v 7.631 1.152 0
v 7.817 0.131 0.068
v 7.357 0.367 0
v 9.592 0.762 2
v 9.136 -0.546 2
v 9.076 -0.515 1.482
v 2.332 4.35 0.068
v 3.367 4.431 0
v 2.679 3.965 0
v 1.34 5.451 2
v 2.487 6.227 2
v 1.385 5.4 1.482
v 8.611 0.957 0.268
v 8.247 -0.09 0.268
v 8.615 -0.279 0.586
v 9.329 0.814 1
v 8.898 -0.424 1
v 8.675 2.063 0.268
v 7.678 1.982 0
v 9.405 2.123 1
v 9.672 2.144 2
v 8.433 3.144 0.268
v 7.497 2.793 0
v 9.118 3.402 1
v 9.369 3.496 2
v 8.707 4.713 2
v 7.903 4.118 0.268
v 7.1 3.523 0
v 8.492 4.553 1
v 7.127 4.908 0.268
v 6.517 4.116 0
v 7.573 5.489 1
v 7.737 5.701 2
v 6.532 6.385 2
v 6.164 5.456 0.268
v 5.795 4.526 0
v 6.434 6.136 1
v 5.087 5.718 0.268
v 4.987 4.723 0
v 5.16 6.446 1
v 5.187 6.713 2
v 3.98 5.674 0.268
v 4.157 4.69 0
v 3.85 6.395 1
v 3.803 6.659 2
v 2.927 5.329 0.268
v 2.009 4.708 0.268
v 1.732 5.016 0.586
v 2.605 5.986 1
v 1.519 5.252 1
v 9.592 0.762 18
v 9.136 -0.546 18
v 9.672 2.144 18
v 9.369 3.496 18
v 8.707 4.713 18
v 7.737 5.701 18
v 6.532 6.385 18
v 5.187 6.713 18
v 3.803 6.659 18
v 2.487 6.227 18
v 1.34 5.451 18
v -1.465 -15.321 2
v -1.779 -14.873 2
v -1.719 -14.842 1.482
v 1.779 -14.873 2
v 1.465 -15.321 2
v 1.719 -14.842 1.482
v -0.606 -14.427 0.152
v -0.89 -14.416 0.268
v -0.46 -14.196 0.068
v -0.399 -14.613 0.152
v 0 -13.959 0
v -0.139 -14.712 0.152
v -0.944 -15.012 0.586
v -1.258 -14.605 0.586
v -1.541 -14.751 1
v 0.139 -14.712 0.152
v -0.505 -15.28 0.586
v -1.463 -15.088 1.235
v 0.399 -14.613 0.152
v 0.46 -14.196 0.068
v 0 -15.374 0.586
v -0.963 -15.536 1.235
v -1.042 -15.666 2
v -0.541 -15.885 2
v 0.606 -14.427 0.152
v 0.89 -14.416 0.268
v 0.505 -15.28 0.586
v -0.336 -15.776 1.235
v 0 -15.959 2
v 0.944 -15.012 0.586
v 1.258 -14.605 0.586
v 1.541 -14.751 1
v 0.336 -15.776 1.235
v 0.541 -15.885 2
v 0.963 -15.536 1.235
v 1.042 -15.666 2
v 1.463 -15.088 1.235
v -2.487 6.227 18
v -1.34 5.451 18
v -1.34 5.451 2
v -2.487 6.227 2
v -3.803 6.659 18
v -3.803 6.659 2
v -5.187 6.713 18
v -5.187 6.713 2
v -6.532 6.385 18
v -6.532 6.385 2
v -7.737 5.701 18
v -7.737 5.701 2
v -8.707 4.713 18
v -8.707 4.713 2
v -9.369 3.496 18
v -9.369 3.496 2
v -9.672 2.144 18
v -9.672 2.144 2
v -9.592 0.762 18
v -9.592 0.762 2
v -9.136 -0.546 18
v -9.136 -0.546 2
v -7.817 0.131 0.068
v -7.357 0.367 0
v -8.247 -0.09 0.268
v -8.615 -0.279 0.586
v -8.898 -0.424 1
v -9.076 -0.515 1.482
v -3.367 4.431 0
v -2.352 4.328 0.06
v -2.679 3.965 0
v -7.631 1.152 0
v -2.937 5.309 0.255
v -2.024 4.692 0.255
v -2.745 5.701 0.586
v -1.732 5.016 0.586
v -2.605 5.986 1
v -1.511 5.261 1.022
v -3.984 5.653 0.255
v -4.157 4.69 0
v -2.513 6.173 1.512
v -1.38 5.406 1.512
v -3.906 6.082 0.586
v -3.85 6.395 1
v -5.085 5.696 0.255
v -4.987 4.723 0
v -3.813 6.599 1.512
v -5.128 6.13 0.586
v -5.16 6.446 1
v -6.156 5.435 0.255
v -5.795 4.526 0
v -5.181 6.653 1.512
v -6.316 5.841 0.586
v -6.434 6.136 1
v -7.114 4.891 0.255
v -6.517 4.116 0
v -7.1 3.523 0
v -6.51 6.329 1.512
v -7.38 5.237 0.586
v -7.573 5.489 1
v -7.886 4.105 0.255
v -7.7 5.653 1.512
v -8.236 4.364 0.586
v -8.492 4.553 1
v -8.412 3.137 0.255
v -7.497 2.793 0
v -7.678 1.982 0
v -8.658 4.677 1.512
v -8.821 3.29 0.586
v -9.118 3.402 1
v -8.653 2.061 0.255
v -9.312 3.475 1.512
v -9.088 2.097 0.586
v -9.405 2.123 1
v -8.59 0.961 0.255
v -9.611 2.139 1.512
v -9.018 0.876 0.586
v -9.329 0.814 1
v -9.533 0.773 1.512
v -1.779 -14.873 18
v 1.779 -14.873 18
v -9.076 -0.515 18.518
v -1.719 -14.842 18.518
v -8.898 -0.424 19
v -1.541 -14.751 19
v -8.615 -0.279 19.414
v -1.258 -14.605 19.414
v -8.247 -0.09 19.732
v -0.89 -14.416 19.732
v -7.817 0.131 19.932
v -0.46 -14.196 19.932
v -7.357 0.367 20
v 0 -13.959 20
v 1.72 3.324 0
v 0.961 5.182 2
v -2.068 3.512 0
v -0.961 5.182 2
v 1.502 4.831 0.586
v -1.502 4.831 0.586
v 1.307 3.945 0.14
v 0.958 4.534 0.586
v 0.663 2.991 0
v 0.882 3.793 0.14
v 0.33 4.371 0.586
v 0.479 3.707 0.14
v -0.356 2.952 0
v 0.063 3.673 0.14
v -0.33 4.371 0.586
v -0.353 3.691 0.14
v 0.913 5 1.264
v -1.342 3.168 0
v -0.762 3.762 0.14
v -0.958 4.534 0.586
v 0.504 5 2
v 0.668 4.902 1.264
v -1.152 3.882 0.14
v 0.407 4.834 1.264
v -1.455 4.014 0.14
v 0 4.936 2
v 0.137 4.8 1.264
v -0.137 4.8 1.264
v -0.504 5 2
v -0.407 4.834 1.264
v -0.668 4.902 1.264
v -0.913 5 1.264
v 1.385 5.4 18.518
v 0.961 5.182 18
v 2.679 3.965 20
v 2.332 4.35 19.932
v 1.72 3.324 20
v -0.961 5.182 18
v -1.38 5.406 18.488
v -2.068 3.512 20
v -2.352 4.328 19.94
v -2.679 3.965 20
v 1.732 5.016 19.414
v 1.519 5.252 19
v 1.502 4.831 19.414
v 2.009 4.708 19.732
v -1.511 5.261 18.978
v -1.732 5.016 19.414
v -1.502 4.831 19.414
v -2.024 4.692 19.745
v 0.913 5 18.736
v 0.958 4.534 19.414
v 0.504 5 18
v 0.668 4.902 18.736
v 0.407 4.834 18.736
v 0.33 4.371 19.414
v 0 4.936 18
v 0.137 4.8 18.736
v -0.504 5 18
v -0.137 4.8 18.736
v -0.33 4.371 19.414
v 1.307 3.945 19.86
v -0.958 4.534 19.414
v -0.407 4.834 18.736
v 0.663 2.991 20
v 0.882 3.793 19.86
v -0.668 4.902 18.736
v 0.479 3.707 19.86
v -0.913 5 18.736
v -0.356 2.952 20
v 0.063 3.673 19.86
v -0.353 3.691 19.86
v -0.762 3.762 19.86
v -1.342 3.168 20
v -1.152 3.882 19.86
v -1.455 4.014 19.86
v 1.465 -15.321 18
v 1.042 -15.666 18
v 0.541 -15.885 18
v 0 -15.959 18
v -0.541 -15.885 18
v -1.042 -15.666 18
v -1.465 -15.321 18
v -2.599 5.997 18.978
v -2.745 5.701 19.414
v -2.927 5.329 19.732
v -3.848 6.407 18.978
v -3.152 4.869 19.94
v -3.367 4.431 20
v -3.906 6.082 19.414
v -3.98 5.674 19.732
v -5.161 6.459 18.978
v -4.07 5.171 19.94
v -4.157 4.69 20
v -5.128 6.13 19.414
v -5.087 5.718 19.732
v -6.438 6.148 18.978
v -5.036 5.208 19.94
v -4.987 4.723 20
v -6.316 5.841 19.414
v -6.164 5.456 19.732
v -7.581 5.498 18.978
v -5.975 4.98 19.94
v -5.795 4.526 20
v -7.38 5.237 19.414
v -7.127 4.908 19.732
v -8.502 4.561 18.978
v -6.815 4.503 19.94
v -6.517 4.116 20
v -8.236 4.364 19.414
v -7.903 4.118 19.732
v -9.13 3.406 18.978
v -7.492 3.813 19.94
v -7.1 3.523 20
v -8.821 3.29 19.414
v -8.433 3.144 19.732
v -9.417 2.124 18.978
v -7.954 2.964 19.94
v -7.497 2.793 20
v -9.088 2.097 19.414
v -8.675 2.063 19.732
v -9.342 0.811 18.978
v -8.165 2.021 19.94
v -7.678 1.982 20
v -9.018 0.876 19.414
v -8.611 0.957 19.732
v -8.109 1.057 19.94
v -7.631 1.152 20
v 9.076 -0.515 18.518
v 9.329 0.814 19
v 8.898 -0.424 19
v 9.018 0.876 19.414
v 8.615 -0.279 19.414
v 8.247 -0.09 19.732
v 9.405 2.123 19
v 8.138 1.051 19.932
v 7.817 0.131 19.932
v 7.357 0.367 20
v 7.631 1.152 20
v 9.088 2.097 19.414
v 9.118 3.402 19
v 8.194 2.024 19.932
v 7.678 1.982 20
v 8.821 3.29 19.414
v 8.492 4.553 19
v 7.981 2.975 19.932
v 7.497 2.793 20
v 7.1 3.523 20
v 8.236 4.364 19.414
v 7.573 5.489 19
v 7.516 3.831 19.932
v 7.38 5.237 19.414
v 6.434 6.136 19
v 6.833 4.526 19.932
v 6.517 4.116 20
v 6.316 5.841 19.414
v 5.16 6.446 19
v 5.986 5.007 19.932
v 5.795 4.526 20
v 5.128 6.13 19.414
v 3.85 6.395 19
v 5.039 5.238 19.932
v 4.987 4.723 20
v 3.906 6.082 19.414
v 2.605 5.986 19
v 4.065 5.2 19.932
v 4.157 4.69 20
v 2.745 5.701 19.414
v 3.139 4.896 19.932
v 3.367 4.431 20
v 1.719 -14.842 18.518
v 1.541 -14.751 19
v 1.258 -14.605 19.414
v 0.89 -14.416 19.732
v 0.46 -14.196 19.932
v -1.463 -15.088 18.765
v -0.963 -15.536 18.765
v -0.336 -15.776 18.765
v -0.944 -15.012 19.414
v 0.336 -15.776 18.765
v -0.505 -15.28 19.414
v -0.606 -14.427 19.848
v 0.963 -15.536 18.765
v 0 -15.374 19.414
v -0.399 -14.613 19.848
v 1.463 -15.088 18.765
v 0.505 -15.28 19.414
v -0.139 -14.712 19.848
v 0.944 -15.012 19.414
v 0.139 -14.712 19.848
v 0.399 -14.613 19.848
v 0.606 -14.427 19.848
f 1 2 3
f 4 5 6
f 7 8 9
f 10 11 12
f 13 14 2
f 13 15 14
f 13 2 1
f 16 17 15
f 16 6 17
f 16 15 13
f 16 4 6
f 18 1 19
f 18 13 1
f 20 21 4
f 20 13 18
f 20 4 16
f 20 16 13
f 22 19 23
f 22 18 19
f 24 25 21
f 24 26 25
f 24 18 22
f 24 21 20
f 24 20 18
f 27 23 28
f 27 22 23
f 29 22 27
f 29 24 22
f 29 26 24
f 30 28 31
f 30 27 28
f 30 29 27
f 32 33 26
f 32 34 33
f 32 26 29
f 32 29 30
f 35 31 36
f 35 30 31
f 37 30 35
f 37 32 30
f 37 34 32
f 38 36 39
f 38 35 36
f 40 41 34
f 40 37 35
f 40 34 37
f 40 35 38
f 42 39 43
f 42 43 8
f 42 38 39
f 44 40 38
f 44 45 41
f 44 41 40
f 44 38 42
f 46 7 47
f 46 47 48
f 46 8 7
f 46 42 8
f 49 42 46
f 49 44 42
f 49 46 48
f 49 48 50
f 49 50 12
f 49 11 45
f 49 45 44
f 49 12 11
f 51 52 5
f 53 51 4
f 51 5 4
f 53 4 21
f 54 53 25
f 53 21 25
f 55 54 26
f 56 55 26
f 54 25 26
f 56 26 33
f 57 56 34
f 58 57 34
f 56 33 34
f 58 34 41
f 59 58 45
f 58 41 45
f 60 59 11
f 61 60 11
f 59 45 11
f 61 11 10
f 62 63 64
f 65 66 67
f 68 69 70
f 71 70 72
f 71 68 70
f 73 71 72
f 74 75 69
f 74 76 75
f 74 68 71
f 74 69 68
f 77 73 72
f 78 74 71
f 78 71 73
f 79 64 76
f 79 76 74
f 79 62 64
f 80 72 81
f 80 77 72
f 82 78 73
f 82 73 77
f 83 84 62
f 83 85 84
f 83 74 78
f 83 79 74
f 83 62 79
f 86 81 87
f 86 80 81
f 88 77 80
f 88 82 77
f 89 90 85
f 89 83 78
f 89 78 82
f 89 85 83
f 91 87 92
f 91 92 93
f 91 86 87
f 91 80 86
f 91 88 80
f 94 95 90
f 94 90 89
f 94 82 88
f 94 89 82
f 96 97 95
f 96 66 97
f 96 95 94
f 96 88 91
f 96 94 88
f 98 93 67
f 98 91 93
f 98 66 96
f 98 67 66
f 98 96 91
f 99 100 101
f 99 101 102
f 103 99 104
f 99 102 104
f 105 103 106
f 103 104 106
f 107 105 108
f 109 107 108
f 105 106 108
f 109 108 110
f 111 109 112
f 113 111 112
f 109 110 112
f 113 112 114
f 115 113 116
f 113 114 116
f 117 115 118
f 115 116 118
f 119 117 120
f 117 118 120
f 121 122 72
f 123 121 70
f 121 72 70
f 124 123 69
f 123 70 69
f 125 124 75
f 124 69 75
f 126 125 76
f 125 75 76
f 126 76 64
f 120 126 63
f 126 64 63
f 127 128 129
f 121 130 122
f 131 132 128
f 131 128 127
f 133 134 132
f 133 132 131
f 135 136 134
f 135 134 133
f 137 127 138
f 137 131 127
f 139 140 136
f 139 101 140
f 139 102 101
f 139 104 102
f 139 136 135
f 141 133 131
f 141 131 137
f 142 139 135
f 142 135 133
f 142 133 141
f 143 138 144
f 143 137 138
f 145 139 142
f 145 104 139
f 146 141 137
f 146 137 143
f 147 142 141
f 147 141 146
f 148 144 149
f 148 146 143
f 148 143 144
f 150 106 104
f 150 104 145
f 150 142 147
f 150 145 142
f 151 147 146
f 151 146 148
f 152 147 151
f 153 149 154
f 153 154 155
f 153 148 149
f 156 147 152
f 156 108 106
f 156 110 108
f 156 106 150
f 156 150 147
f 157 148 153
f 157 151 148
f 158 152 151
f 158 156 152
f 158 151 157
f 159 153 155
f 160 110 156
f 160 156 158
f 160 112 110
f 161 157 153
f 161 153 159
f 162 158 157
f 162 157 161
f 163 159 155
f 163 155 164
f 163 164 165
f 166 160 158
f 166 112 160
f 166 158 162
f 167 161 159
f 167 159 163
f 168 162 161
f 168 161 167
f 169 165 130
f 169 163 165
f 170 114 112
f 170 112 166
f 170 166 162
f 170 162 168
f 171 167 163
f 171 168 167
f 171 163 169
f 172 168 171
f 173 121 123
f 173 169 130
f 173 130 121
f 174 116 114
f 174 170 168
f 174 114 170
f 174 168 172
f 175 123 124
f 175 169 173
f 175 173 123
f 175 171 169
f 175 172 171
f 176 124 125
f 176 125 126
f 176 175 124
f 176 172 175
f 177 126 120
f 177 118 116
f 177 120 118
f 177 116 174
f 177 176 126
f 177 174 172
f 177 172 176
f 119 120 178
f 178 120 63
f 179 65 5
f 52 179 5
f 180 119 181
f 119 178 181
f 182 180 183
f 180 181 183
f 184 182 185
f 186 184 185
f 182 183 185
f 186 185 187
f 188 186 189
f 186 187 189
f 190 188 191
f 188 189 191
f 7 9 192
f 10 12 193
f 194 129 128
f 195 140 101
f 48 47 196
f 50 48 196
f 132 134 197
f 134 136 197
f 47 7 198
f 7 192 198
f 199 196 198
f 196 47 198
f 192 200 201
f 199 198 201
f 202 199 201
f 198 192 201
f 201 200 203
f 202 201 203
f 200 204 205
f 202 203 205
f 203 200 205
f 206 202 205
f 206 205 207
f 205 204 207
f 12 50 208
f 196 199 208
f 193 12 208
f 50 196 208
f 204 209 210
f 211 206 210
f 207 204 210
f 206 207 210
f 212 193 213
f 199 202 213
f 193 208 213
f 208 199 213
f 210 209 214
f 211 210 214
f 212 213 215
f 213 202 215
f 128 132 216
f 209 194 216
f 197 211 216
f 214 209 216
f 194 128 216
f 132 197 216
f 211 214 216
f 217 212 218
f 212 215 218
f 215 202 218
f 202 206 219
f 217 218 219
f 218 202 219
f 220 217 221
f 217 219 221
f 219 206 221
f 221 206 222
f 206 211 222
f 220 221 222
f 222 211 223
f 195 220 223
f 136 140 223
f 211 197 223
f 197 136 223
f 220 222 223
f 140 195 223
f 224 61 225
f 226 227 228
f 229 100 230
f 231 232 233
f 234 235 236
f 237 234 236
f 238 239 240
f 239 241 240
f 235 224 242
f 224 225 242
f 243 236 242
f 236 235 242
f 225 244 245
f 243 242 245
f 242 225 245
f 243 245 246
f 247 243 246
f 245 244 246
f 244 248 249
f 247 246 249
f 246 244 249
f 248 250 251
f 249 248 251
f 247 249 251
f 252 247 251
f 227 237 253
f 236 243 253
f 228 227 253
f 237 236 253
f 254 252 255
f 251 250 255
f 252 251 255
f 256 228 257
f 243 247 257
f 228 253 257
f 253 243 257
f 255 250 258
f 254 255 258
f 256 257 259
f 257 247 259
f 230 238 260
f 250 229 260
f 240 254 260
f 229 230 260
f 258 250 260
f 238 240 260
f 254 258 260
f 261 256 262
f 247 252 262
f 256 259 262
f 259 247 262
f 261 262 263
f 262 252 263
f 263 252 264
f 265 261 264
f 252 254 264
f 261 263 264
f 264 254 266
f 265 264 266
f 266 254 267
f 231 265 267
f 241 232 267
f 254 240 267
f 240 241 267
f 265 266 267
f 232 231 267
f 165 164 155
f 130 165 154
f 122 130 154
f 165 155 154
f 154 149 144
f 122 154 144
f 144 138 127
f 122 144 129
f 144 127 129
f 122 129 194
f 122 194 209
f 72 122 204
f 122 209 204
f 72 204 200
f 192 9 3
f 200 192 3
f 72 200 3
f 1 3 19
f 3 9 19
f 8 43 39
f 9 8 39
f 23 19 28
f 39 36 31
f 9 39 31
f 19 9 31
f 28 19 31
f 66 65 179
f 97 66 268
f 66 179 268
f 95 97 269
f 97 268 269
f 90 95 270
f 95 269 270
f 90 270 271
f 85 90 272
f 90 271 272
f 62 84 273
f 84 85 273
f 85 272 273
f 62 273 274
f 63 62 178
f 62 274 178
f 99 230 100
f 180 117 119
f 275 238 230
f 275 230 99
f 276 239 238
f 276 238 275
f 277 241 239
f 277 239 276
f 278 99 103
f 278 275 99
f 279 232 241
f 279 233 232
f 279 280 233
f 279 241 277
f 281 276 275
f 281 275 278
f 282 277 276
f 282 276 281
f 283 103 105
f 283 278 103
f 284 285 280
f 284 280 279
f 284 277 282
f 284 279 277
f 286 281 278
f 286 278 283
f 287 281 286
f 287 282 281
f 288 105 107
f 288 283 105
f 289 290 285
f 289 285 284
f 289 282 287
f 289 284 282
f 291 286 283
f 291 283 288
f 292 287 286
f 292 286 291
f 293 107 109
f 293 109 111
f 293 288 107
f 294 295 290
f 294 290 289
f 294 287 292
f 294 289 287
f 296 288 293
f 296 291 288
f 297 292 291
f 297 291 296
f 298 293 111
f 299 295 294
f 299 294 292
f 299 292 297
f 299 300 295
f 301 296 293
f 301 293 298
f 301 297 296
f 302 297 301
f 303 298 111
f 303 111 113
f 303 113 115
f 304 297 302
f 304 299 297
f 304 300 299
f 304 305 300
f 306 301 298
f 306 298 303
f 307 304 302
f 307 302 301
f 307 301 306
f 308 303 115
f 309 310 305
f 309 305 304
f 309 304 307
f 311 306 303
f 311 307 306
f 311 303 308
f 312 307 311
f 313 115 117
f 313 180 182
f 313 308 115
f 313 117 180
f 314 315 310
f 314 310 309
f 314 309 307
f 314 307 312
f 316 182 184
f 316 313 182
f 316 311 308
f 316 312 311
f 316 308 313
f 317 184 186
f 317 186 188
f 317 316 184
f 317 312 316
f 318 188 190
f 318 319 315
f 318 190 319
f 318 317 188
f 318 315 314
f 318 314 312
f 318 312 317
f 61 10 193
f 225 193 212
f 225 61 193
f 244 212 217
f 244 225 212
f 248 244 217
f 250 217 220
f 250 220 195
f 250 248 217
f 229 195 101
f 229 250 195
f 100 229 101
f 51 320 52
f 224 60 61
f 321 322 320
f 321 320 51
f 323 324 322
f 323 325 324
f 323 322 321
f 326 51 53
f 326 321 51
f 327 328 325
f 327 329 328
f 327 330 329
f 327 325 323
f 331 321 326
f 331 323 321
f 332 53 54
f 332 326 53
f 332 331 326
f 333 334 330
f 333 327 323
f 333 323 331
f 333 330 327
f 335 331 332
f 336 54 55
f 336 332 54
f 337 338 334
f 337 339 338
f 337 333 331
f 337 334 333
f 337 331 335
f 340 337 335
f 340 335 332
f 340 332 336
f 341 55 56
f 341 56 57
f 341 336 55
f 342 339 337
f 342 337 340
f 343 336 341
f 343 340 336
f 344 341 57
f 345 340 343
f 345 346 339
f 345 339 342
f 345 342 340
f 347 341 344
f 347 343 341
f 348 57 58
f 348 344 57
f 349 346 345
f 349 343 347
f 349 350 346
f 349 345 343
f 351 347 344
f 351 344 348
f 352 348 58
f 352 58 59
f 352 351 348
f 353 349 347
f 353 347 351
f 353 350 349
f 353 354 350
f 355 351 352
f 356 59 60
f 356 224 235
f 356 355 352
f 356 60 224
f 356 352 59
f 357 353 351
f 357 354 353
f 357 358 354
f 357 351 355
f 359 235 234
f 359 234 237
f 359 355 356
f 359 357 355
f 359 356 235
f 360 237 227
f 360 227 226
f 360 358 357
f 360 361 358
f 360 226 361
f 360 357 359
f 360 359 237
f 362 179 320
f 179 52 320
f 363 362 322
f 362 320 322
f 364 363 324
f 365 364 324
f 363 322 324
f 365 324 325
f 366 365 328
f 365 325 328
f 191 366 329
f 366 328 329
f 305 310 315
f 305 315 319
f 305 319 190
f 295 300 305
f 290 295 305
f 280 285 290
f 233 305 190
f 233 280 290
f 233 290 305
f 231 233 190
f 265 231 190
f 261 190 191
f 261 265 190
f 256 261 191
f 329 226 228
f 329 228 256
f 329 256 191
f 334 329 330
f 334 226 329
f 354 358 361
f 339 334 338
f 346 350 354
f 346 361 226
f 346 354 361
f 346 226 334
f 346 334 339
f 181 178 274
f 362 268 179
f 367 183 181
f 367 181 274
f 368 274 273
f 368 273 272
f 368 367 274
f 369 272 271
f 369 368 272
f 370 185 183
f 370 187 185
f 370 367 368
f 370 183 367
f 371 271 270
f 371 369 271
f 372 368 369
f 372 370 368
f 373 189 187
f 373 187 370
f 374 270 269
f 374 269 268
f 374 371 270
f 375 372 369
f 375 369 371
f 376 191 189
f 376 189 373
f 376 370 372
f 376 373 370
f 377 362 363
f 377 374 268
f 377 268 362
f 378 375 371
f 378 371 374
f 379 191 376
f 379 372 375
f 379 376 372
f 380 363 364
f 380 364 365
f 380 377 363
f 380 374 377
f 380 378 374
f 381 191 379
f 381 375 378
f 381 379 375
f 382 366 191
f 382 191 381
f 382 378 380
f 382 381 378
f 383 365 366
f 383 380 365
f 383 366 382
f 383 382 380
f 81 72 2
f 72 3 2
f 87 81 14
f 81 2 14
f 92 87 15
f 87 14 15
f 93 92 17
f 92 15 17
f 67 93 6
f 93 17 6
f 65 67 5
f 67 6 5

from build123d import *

# Parameters (mm, degrees)
F1_DEPTH = 20
F2_F1_R  = 2
F2_F2_R  = 2
F2_F3_R  = 2


with BuildPart() as f1:
    # F0 (on Top) → F1 (new body)
    with BuildSketch(Plane.XY):
        with BuildLine():
            ThreePointArc((0, 3.4753886408), (-6.702786735, 6.3139324677), (-9.1361551027, -0.5463444553))
            Line((-9.1361551027, -0.5463444553), (0, -18.3376532868))
            Line((0, -18.3376532868), (9.1361551027, -0.5463444553))
            ThreePointArc((9.1361551027, -0.5463444553), (6.702786735, 6.3139324677), (0, 3.4753886408))
        make_face()
        with BuildLine():
            ThreePointArc((0, 0), (-0.3116721052, 1.7376943204), (0, 3.4753886408))
            ThreePointArc((0, 3.4753886408), (0.3116721052, 1.7376943204), (0, 0))
        make_face(mode=Mode.SUBTRACT)
        with BuildLine():
            ThreePointArc((0, 0), (0.3116721052, 1.7376943204), (0, 3.4753886408))
            ThreePointArc((0, 3.4753886408), (-0.3116721052, 1.7376943204), (0, 0))
        make_face()
    extrude(amount=F1_DEPTH)

    # F2: fillet of radius 2 on 7 edges, made by hand

    # F2_f1
    f2_f1_edges = [f1.edges().sort_by_distance(p)[0] for p in [
        (0, 3.4753886408, 10),
    ]]
    fillet(f2_f1_edges, radius=F2_F1_R)

    # F2_f2
    f2_f2_edges = [f1.edges().sort_by_distance(p)[0] for p in [
        (0, -18.3376532868, 10),
    ]]
    fillet(f2_f2_edges, radius=F2_F2_R)

    # F2_f3
    f2_f3_edges = [f1.edges().sort_by_distance(p)[0] for p in [
        (7.7367258426, 5.7009341506, 0),
        (7.7367258426, 5.7009341506, 20),
        (5.4576429929, -7.7097019344, 0),
        (5.4576429929, -7.7097019344, 20),
        (0, -15.9594439033, 20),
        (0, -15.9594439033, 0),
        (1e-10, 4.9357306327, 20),
        (1e-10, 4.9357306327, 0),
    ]]
    fillet(f2_f3_edges, radius=F2_F3_R)


solid = f1.part
